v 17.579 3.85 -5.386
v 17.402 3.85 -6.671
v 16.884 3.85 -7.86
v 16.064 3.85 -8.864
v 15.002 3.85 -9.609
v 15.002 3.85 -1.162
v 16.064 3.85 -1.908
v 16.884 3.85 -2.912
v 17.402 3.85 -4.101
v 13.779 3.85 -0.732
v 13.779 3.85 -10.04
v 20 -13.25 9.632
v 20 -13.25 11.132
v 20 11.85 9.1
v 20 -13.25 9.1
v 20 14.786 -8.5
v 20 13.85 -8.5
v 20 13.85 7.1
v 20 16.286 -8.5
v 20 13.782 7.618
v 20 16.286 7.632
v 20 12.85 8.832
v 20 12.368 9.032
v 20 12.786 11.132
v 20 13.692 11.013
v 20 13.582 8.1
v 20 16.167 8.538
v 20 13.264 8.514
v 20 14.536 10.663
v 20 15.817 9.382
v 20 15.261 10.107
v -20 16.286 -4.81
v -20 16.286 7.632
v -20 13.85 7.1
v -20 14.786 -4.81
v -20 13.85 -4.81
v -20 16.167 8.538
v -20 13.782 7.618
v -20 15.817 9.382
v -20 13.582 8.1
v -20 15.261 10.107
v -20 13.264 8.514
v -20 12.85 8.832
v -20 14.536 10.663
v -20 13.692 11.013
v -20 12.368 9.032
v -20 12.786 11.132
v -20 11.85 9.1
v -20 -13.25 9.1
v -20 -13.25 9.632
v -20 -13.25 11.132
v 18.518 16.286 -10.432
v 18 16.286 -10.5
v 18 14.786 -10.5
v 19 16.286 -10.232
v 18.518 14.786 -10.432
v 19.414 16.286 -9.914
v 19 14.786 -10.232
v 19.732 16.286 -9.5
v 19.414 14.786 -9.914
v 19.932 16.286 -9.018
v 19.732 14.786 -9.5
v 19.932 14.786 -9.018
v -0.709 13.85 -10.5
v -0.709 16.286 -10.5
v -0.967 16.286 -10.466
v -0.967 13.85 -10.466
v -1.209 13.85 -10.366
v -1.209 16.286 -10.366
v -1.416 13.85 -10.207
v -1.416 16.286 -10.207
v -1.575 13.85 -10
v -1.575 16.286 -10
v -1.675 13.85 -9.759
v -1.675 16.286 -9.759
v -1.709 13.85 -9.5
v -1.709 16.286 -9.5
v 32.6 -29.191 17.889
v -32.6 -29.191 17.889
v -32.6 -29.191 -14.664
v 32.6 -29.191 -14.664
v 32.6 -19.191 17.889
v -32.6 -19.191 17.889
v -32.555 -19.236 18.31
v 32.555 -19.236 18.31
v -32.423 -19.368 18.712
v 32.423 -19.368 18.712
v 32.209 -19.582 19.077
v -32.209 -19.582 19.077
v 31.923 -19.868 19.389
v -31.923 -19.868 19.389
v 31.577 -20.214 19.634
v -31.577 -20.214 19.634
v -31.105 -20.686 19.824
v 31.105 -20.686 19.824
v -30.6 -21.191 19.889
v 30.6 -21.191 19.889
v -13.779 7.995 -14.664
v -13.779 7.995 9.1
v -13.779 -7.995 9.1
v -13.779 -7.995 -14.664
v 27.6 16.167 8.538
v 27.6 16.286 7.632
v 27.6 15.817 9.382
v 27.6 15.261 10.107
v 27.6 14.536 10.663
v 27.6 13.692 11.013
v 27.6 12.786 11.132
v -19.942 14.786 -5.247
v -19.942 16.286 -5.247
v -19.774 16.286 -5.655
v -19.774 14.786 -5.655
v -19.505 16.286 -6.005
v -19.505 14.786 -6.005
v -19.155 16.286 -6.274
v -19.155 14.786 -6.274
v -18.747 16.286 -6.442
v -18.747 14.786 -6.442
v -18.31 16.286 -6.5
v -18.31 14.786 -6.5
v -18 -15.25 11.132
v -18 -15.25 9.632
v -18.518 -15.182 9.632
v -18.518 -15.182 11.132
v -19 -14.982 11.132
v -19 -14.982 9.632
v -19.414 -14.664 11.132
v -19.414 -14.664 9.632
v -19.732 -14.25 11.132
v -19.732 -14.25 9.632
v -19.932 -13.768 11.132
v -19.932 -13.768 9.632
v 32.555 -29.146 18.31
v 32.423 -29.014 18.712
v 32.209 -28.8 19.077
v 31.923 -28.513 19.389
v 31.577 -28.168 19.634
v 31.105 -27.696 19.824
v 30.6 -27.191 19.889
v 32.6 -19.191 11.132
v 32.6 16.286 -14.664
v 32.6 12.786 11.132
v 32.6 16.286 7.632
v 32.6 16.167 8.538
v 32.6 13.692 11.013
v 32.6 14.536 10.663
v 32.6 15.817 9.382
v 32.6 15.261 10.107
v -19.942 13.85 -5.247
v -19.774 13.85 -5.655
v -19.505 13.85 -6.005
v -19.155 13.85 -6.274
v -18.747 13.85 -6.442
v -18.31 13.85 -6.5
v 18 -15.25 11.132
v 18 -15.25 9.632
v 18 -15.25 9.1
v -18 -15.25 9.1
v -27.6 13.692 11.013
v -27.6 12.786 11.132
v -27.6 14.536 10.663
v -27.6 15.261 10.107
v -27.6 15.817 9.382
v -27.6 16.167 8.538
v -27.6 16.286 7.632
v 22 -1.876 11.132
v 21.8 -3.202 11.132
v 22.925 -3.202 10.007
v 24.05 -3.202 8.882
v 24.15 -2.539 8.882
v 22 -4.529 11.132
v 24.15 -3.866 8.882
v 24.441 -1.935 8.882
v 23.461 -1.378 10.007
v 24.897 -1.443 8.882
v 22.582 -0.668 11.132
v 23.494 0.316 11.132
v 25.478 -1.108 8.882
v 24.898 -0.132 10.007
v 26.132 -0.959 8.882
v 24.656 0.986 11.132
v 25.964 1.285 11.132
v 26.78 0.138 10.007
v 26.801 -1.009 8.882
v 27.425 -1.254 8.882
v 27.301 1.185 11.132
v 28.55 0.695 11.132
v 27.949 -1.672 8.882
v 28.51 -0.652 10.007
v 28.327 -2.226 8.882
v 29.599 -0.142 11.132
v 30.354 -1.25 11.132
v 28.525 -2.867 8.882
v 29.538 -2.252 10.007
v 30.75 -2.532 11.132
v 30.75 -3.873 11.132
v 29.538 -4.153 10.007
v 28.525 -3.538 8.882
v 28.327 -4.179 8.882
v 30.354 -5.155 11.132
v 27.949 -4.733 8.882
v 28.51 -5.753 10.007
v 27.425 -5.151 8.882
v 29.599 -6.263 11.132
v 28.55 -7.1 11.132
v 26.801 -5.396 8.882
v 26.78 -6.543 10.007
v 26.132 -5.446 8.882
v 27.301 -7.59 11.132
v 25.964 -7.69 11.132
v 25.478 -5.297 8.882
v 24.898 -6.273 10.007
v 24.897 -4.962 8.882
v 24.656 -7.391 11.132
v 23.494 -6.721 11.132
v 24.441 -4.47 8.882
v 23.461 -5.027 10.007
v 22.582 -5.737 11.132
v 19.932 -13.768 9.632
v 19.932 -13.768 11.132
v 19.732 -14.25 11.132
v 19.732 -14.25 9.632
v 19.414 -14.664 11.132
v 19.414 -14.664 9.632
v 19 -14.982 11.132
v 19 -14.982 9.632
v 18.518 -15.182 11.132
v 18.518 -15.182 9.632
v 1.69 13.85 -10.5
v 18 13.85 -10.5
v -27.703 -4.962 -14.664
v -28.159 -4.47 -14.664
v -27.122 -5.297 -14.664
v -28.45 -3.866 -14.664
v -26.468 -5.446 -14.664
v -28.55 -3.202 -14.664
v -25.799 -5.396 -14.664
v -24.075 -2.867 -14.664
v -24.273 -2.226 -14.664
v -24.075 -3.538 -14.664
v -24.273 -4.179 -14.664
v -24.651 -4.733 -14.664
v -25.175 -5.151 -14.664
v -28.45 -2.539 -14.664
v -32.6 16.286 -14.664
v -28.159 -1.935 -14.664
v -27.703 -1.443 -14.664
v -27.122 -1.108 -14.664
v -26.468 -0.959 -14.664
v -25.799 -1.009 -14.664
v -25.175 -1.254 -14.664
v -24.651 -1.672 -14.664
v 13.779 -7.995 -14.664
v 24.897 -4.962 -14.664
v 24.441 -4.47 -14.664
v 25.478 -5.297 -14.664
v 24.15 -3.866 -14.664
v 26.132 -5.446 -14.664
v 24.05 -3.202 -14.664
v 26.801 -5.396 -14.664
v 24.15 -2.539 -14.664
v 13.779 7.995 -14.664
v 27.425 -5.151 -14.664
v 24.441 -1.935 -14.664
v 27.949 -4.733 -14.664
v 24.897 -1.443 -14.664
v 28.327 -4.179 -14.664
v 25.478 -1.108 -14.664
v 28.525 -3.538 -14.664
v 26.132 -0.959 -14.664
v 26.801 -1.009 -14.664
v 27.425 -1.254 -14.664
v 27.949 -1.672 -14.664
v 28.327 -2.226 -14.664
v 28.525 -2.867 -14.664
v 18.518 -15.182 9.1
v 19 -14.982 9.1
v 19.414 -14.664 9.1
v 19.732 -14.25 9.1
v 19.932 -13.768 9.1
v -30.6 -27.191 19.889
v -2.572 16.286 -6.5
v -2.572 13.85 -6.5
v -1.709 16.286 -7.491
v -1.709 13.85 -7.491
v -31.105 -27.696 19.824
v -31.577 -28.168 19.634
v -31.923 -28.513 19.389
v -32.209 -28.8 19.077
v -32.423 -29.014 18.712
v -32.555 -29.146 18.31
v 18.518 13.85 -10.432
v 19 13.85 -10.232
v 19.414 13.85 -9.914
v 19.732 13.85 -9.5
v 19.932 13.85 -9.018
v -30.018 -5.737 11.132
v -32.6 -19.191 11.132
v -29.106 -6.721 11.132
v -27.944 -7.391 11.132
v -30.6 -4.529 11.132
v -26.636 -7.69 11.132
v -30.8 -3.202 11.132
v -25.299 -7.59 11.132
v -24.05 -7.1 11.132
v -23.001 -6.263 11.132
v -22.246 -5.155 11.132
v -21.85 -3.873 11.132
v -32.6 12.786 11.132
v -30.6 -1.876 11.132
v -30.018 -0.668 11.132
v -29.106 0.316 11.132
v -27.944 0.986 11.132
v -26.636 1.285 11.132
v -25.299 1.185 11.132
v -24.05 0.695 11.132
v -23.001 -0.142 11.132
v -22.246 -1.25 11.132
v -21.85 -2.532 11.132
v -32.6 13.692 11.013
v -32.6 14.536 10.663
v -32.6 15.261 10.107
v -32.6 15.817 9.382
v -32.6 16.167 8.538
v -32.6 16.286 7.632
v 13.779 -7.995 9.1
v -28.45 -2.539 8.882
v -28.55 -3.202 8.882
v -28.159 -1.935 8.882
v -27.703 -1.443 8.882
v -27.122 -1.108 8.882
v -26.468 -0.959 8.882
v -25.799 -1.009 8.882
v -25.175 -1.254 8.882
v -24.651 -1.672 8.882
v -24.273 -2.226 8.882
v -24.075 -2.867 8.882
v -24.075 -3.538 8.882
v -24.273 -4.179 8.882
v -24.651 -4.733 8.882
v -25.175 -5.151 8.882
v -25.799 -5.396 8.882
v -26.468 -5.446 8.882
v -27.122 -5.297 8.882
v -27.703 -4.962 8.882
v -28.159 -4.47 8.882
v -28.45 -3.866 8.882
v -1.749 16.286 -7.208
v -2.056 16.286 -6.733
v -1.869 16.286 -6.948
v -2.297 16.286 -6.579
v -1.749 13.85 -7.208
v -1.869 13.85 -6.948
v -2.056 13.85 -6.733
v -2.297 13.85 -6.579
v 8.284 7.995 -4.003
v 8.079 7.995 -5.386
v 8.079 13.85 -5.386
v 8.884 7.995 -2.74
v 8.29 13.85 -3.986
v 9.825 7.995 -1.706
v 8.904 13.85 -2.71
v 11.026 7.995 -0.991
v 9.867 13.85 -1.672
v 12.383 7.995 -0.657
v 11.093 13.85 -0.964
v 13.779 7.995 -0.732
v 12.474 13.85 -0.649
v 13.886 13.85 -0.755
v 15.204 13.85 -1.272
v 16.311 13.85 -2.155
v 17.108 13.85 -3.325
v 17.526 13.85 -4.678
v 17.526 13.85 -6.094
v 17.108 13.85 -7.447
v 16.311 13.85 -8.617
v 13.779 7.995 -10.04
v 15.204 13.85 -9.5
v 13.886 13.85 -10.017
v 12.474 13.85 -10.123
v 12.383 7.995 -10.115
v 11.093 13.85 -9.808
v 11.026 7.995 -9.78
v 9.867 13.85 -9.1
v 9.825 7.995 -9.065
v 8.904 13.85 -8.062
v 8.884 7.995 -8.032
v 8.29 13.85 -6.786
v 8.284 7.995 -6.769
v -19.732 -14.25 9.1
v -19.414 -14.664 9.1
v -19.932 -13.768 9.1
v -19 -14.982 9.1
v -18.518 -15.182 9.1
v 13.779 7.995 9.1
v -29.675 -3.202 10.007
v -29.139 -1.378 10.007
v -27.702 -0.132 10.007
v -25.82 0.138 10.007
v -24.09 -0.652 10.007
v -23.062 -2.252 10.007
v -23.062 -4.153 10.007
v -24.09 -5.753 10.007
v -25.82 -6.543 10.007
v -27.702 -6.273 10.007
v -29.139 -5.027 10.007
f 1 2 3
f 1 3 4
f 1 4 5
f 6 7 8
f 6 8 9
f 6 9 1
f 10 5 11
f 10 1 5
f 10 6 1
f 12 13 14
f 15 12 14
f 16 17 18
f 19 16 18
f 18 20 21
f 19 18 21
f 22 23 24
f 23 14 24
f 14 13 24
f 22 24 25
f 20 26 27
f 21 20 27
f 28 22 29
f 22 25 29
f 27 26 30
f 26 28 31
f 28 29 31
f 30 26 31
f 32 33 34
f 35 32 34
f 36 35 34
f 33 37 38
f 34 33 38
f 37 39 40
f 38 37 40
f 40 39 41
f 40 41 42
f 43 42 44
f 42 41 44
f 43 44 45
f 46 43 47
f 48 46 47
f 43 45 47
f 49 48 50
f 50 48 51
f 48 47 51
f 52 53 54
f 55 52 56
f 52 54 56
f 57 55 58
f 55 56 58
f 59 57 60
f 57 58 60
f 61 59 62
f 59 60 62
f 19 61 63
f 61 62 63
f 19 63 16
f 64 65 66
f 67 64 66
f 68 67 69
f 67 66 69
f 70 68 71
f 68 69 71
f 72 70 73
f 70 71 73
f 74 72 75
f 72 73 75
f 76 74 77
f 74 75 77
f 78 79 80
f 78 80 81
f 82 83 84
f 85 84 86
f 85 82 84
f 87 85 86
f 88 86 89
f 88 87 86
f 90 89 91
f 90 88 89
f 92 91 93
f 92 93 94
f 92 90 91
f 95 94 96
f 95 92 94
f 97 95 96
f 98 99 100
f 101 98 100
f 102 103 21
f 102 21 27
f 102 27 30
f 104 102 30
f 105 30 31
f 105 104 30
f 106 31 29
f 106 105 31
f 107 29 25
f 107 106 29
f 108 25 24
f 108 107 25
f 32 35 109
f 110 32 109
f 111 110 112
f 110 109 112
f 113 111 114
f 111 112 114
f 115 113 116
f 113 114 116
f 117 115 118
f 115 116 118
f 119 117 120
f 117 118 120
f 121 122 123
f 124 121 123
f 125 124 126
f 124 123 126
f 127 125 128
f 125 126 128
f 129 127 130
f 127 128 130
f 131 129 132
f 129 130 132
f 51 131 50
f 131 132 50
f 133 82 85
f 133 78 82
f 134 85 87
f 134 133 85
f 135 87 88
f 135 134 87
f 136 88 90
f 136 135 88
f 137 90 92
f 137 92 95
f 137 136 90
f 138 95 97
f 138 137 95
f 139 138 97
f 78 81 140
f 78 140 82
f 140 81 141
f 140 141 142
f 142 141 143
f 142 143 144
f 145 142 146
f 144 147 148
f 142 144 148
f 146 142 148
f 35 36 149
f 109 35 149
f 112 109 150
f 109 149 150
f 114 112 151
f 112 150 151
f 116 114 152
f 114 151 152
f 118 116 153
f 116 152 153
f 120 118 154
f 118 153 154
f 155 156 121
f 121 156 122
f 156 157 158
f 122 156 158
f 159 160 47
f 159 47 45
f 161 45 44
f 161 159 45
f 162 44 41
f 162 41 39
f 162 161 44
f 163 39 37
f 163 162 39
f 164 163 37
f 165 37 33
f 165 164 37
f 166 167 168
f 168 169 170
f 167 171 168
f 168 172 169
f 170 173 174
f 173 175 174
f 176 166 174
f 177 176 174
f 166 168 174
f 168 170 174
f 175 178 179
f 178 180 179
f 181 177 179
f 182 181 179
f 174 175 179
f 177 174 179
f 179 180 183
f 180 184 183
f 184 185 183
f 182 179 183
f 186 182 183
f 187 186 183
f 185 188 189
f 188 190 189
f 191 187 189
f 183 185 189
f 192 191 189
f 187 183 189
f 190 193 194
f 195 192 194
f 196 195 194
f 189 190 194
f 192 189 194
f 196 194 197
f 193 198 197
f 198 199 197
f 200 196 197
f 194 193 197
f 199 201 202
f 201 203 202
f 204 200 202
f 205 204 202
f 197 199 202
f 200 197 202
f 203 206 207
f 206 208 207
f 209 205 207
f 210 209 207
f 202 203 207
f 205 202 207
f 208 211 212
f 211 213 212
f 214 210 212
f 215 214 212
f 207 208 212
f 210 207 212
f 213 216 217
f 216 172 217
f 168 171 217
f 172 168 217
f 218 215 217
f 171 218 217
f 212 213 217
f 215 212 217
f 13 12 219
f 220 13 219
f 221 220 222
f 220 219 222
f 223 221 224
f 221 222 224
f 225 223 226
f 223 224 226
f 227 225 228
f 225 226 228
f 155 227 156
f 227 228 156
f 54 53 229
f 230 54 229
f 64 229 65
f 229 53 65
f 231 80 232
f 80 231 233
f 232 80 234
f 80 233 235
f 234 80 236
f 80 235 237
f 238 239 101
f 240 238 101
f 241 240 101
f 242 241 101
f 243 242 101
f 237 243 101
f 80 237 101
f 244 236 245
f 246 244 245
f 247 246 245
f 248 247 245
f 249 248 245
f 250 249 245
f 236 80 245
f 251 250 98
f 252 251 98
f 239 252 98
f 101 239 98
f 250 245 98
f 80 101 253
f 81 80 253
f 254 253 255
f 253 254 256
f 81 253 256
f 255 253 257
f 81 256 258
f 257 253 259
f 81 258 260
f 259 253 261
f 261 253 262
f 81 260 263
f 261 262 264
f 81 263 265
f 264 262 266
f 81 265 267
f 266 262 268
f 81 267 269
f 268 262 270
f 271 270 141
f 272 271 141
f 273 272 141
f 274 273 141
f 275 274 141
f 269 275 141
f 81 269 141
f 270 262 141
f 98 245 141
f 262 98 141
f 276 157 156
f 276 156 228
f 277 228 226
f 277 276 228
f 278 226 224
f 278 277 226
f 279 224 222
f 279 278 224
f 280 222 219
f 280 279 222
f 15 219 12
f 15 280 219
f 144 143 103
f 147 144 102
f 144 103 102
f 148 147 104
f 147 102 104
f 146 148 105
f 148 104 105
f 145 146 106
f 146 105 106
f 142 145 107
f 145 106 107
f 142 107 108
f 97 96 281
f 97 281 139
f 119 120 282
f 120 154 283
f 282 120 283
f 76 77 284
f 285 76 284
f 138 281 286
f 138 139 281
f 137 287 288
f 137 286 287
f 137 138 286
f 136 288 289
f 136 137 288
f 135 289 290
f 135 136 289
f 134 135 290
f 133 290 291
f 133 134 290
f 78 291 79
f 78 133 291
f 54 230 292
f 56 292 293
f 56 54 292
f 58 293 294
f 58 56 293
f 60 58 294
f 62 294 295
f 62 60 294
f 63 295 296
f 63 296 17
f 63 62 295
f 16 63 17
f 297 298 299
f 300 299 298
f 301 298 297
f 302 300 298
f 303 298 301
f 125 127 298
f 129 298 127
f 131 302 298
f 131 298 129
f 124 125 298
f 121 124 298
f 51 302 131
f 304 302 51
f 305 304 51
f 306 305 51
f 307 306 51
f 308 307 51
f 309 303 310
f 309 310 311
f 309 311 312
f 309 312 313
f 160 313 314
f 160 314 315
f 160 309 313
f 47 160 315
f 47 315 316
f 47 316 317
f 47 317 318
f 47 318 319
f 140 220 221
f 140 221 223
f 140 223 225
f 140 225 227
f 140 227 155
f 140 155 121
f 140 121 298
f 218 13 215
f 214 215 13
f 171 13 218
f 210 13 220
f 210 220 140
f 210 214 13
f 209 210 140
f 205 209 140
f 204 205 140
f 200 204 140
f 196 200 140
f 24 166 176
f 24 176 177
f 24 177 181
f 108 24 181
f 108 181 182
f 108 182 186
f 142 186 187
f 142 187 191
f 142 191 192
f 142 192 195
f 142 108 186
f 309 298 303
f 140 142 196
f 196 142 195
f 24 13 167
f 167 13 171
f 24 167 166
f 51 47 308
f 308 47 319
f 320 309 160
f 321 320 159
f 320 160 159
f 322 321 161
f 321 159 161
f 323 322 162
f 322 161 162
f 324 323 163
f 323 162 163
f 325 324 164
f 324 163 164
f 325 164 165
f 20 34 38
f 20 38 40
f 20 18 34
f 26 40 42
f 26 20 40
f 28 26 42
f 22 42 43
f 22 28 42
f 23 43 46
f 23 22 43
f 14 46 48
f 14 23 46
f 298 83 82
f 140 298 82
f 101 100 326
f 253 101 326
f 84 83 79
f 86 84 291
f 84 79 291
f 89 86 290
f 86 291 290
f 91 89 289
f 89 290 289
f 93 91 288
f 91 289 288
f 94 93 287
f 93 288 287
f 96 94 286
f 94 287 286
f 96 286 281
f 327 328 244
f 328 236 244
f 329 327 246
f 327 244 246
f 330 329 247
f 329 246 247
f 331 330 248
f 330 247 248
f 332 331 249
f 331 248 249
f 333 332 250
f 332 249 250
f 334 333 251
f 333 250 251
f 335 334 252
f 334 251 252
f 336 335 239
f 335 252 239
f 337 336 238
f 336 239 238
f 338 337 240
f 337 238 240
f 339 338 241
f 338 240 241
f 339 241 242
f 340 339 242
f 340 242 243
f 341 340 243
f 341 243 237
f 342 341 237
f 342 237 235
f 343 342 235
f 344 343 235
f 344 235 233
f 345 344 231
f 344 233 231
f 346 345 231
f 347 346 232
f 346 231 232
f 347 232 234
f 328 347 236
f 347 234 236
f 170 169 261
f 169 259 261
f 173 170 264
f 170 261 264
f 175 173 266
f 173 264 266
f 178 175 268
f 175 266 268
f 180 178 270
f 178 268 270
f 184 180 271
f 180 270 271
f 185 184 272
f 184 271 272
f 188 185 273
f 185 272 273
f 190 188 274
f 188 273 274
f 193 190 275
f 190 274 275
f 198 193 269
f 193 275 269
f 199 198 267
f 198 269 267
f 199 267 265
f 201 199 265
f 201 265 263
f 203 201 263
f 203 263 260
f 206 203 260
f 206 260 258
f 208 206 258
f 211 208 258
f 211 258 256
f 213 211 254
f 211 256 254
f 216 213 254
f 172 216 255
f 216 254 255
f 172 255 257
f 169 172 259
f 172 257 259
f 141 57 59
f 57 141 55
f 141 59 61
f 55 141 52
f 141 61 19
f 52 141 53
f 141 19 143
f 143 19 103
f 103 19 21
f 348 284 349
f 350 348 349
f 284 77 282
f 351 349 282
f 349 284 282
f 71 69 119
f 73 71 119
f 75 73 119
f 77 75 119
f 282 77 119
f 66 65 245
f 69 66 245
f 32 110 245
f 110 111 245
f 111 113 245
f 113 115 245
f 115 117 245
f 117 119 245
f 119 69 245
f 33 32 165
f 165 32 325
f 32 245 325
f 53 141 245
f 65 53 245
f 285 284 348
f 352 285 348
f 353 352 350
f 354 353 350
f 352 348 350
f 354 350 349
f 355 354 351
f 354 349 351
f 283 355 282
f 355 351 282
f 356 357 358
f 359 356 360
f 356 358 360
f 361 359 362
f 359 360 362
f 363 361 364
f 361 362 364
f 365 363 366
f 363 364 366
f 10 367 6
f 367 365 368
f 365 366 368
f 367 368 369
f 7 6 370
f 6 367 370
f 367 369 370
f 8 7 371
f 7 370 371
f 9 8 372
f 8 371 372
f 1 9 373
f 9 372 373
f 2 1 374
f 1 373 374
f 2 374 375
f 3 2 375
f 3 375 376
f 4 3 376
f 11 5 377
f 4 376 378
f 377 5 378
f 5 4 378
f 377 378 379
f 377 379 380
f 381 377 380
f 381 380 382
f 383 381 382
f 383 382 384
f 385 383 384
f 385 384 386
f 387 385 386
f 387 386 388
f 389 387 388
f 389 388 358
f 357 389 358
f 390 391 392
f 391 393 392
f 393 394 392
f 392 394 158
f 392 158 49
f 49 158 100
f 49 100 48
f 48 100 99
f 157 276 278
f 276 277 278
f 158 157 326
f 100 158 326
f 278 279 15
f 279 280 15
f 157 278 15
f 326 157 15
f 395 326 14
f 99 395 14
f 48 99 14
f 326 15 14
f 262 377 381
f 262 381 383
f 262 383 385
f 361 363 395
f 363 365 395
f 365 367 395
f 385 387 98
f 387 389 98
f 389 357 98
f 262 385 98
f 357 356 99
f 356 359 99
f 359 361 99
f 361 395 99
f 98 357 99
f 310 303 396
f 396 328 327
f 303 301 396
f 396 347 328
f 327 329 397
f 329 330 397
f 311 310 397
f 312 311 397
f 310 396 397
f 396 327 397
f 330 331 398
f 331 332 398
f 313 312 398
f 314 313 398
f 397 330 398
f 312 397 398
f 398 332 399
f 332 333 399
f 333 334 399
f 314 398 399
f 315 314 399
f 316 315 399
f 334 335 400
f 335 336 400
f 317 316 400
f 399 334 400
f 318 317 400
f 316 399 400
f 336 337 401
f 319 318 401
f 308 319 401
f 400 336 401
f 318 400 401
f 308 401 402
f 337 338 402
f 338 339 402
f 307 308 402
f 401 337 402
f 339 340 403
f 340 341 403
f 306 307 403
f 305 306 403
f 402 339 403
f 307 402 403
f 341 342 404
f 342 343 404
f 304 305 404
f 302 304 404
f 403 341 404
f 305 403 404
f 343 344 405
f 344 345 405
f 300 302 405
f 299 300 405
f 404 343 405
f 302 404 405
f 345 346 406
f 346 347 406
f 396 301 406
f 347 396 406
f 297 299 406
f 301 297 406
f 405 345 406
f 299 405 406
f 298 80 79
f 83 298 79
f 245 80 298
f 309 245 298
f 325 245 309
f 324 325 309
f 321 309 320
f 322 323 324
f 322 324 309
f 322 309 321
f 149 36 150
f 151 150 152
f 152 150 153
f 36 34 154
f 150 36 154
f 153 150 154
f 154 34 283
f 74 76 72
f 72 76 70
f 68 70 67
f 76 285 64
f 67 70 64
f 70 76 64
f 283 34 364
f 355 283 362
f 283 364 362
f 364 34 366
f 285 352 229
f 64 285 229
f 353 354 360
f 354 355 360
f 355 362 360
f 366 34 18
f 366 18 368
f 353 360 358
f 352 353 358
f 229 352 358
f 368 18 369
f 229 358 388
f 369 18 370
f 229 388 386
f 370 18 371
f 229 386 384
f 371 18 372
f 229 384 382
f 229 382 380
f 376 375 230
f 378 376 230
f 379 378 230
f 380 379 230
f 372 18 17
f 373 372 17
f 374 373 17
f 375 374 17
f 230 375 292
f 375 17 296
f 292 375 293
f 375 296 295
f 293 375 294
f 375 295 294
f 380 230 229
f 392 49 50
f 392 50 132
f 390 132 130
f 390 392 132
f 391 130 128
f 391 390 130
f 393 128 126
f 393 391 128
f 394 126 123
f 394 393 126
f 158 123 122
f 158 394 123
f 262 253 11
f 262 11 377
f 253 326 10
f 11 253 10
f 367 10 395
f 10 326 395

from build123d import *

# Parameters (mm, degrees)
F1_DEPTH        = 20
F2_R            = 2
F3_R            = 3
F4_R            = 2
F5_W            = 20
F5_H            = 4
F6_DEPTH        = 8.3
F7_R            = 1.6899494937
F9_DEPTH        = 27.6
F12_R           = 4.75
F13_DEPTH       = 10
F15_DEPTH       = 7.6
F17_DEPTH       = 7.6
F19_DEPTH       = 1.5000002459
F21_DEPTH       = 1.5000002459
F23_DEPTH       = 5
F25_DEPTH       = 5
F27_DEPTH       = 2.4358335286
F28_W           = 65.2
F28_H           = 2.6260968298
F29_DEPTH       = 25.7963873446
F31_D           = 4.5
F31_CSINK_D     = 9
F31_CSINK_ANGLE = 90
F33_DEPTH       = 25
F34_W           = 65.2
F34_H           = 34.5529383048
F35_DEPTH       = 10
F36_R           = 2


with BuildPart() as f1:
    # F0 (on Right) → F1 (new body, symmetric)
    with BuildSketch(Plane.YZ):
        Polygon((15.25, 10.5), (-15.25, 10.5), (-15.25, 9.100000374), (13.850000374, 9.100000374), (13.850000374, -10.5), (15.25, -10.5), align=None)
    extrude(amount=F1_DEPTH, both=True)

    # F2
    f2_edges = [f1.edges().sort_by_distance(p)[0] for p in [
        (0, 13.85, 9.1),
    ]]
    fillet(f2_edges, radius=F2_R)

    # F3
    f3_edges = [f1.edges().sort_by_distance(p)[0] for p in [
        (0, 15.25, 10.5),
    ]]
    fillet(f3_edges, radius=F3_R)

    # F4
    f4_edges = [f1.edges().sort_by_distance(p)[0] for p in [
        (20, 14.55, -10.5),
        (20, -15.25, 9.8),
        (-20, -15.25, 9.8),
    ]]
    fillet(f4_edges, radius=F4_R)

    # F5 (on face) → F6 (cut)
    with BuildSketch(Plane(origin=(0, 15.25, 0), x_dir=(-1, 0, 0), z_dir=(0, 1, 0))):
        with Locations((10, -8.5)):
            Rectangle(F5_W, F5_H)
    extrude(amount=-F6_DEPTH, mode=Mode.SUBTRACT)

    # F7
    f7_edges = [f1.edges().sort_by_distance(p)[0] for p in [
        (-20, 14.55, -6.5),
        (0, 14.55, -10.5),
        (0, 14.55, -6.5),
    ]]
    fillet(f7_edges, radius=F7_R)


with BuildPart() as f9:
    # F8 (on Right) → F9 (new body, symmetric)
    with BuildSketch(Plane.YZ):
        with BuildLine():
            Line((12.7858336568, 9.6320193261), (-14.7858336568, 9.6320193261))
            Line((-14.7858336568, 9.6320193261), (-16.5647212416, 9.6320193261))
            Line((-16.5647212416, 9.6320193261), (-16.5647212416, -14.6643677726))
            Line((-16.5647212416, -14.6643677726), (14.7858336568, -14.6643677726))
            Line((14.7858336568, -14.6643677726), (14.7858336568, -9.6320193261))
            Line((14.7858336568, -9.6320193261), (14.7858336568, 7.6320193261))
            ThreePointArc((14.7858336568, 7.6320193261), (14.2000472192, 9.0462328885), (12.7858336568, 9.6320193261))
        make_face()
    extrude(amount=F9_DEPTH, both=True)

    # F10: cut F1
    add(f1.part, mode=Mode.SUBTRACT)

    # F12 (on face) → F13 (cut)
    with BuildSketch(Plane(origin=(0, 13.850000374, 0), x_dir=(-1, 0, 0), z_dir=(0, 1, 0))):
        with Locations((-12.8287095577, -5.3859017789)):
            Circle(F12_R)
    extrude(amount=-F13_DEPTH, mode=Mode.SUBTRACT)

    # F14 (on face) → F15 (join, through all)
    with BuildSketch(Plane.YZ.offset(27.6)):
        with BuildLine():
            Line((16.2858339027, -14.6643677726), (16.2858339027, 7.6320193261))
            ThreePointArc((16.2858339027, 7.6320193261), (15.2607075648, 10.1068932341), (12.7858336568, 11.132019572))
            Line((12.7858336568, 11.132019572), (-16.5647212416, 11.132019572))
            Line((-16.5647212416, 11.132019572), (-16.5647212416, -14.6643677726))
            Line((-16.5647212416, -14.6643677726), (16.2858339027, -14.6643677726))
        make_face()
    extrude(amount=-F15_DEPTH)

    # F16 (on face) → F17 (join, through all)
    with BuildSketch(Plane(origin=(-27.6, 0, 0), x_dir=(0, -1, 0), z_dir=(-1, 0, 0))):
        with BuildLine():
            ThreePointArc((-12.7858336568, 11.132019572), (-15.2607075648, 10.1068932341), (-16.2858339027, 7.6320193261))
            Line((-16.2858339027, 7.6320193261), (-16.2858339027, -14.6643677726))
            Line((-16.2858339027, -14.6643677726), (16.5647212416, -14.6643677726))
            Line((16.5647212416, -14.6643677726), (16.5647212416, 11.132019572))
            Line((16.5647212416, 11.132019572), (-12.7858336568, 11.132019572))
        make_face()
    extrude(amount=-F17_DEPTH)

    # F18 (on face) → F19 (join, through all)
    with BuildSketch(Plane.XY.offset(9.6320193261)):
        with BuildLine():
            Line((-20, -16.5647212416), (20, -16.5647212416))
            Line((20, -16.5647212416), (20, -13.25))
            ThreePointArc((20, -13.25), (19.4142135624, -14.6642135624), (18, -15.25))
            Line((18, -15.25), (-18, -15.25))
            ThreePointArc((-18, -15.25), (-19.4142135624, -14.6642135624), (-20, -13.25))
            Line((-20, -13.25), (-20, -16.5647212416))
        make_face()
    extrude(amount=F19_DEPTH)

    # F20 (on face) → F21 (join, through all)
    with BuildSketch(Plane(origin=(0, 14.7858336568, 0), x_dir=(-1, 0, 0), z_dir=(0, 1, 0))):
        with BuildLine():
            Line((-20, -8.5), (-20, -14.6643677726))
            Line((-20, -14.6643677726), (20, -14.6643677726))
            Line((20, -14.6643677726), (20, -4.8100505063))
            ThreePointArc((20, -4.8100505063), (19.5050252532, -6.0050252532), (18.3100505063, -6.5))
            Line((18.3100505063, -6.5), (1.6899494937, -6.5))
            ThreePointArc((1.6899494937, -6.5), (0.4949747468, -6.9949747468), (0, -8.1899494937))
            Line((0, -8.1899494937), (0, -8.8100505063))
            ThreePointArc((0, -8.8100505063), (-0.4949747468, -10.0050252532), (-1.6899494937, -10.5))
            Line((-1.6899494937, -10.5), (-18, -10.5))
            ThreePointArc((-18, -10.5), (-19.4142135624, -9.9142135624), (-20, -8.5))
        make_face()
    extrude(amount=F21_DEPTH)

    # F22 (on face) → F23 (join)
    with BuildSketch(Plane(origin=(-27.6, 0, 0), x_dir=(0, -1, 0), z_dir=(-1, 0, 0))):
        with BuildLine():
            Line((-16.2858339027, -14.6643677726), (16.5647212416, -14.6643677726))
            Line((16.5647212416, -14.6643677726), (16.5647212416, 11.132019572))
            Line((16.5647212416, 11.132019572), (-12.7858339027, 11.132019572))
            ThreePointArc((-12.7858339027, 11.132019572), (-15.2607076368, 10.1068933061), (-16.2858339027, 7.632019572))
            Line((-16.2858339027, 7.632019572), (-16.2858339027, -14.6643677726))
        make_face()
    extrude(amount=F23_DEPTH)

    # F24 (on face) → F25 (join)
    with BuildSketch(Plane.YZ.offset(27.6)):
        with BuildLine():
            Line((-16.5647212416, 11.132019572), (-16.5647212416, -14.6643677726))
            Line((-16.5647212416, -14.6643677726), (16.2858339027, -14.6643677726))
            Line((16.2858339027, -14.6643677726), (16.2858339027, 7.632019572))
            ThreePointArc((16.2858339027, 7.632019572), (15.2607076368, 10.1068933061), (12.7858339027, 11.132019572))
            Line((12.7858339027, 11.132019572), (-16.5647212416, 11.132019572))
        make_face()
    extrude(amount=F25_DEPTH)

    # F26 (on face) → F27 (cut, through all)
    with BuildSketch(Plane(origin=(0, 16.2858339027, 0), x_dir=(-1, 0, 0), z_dir=(0, 1, 0))):
        with BuildLine():
            Line((1.7086403866, -9.5), (1.7086403866, -8.1106565775))
            Line((1.7086403866, -8.1106565775), (1.7086403866, -7.4905555649))
            ThreePointArc((1.7086403866, -7.4905555649), (1.9546138952, -6.8337115572), (2.5715284873, -6.5))
            Line((2.5715284873, -6.5), (-1.6899494937, -6.5))
            Line((-1.6899494937, -6.5), (-1.6899494937, -10.5))
            Line((-1.6899494937, -10.5), (0.7086403866, -10.5))
            ThreePointArc((0.7086403866, -10.5), (1.4157471677, -10.2071067812), (1.7086403866, -9.5))
        make_face()
        with BuildLine():
            ThreePointArc((2.8457522858, -6.5), (2.7086403866, -6.4905555649), (2.5715284873, -6.5))
            Line((2.5715284873, -6.5), (2.8457522858, -6.5))
        make_face()
    extrude(amount=-F27_DEPTH, mode=Mode.SUBTRACT)

    # F28 (on face) → F29 (join, through all)
    with BuildSketch(Plane.XY.offset(11.132019572)):
        with Locations((0, -17.8777696565)):
            Rectangle(F28_W, F28_H)
    extrude(amount=-F29_DEPTH)

    # F31 (through all)
    with Locations(Plane.XY.offset(11.132019572)):
        with Locations((26.3, -3.2024922073), (-26.3, -3.2024922073)):
            CounterSinkHole(F31_D / 2, F31_CSINK_D / 2, counter_sink_angle=F31_CSINK_ANGLE)

    # F32 (on face) → F33 (cut)
    with BuildSketch(Plane.XY.offset(9.100000374)):
        Polygon((-13.7790497392, -0.699999813), (-13.7790497392, -7.9947467893), (13.7790497392, -7.9947467893), (13.7790497392, 7.9947467893), (-13.7790497392, 7.9947467893), align=None)
    extrude(amount=-F33_DEPTH, mode=Mode.SUBTRACT)

    # F34 (on face) → F35 (join)
    with BuildSketch(Plane.XZ.offset(19.1908180714)):
        with Locations((0, 2.6121013798)):
            Rectangle(F34_W, F34_H)
    extrude(amount=F35_DEPTH)

    # F36
    f36_edges = [f9.edges().sort_by_distance(p)[0] for p in [
        (32.6, -24.190818, 19.888571),
        (-32.6, -24.190818, 19.888571),
        (0, -19.190818, 19.888571),
        (0, -29.190818, 19.888571),
    ]]
    fillet(f36_edges, radius=F36_R)


solid = f9.part
